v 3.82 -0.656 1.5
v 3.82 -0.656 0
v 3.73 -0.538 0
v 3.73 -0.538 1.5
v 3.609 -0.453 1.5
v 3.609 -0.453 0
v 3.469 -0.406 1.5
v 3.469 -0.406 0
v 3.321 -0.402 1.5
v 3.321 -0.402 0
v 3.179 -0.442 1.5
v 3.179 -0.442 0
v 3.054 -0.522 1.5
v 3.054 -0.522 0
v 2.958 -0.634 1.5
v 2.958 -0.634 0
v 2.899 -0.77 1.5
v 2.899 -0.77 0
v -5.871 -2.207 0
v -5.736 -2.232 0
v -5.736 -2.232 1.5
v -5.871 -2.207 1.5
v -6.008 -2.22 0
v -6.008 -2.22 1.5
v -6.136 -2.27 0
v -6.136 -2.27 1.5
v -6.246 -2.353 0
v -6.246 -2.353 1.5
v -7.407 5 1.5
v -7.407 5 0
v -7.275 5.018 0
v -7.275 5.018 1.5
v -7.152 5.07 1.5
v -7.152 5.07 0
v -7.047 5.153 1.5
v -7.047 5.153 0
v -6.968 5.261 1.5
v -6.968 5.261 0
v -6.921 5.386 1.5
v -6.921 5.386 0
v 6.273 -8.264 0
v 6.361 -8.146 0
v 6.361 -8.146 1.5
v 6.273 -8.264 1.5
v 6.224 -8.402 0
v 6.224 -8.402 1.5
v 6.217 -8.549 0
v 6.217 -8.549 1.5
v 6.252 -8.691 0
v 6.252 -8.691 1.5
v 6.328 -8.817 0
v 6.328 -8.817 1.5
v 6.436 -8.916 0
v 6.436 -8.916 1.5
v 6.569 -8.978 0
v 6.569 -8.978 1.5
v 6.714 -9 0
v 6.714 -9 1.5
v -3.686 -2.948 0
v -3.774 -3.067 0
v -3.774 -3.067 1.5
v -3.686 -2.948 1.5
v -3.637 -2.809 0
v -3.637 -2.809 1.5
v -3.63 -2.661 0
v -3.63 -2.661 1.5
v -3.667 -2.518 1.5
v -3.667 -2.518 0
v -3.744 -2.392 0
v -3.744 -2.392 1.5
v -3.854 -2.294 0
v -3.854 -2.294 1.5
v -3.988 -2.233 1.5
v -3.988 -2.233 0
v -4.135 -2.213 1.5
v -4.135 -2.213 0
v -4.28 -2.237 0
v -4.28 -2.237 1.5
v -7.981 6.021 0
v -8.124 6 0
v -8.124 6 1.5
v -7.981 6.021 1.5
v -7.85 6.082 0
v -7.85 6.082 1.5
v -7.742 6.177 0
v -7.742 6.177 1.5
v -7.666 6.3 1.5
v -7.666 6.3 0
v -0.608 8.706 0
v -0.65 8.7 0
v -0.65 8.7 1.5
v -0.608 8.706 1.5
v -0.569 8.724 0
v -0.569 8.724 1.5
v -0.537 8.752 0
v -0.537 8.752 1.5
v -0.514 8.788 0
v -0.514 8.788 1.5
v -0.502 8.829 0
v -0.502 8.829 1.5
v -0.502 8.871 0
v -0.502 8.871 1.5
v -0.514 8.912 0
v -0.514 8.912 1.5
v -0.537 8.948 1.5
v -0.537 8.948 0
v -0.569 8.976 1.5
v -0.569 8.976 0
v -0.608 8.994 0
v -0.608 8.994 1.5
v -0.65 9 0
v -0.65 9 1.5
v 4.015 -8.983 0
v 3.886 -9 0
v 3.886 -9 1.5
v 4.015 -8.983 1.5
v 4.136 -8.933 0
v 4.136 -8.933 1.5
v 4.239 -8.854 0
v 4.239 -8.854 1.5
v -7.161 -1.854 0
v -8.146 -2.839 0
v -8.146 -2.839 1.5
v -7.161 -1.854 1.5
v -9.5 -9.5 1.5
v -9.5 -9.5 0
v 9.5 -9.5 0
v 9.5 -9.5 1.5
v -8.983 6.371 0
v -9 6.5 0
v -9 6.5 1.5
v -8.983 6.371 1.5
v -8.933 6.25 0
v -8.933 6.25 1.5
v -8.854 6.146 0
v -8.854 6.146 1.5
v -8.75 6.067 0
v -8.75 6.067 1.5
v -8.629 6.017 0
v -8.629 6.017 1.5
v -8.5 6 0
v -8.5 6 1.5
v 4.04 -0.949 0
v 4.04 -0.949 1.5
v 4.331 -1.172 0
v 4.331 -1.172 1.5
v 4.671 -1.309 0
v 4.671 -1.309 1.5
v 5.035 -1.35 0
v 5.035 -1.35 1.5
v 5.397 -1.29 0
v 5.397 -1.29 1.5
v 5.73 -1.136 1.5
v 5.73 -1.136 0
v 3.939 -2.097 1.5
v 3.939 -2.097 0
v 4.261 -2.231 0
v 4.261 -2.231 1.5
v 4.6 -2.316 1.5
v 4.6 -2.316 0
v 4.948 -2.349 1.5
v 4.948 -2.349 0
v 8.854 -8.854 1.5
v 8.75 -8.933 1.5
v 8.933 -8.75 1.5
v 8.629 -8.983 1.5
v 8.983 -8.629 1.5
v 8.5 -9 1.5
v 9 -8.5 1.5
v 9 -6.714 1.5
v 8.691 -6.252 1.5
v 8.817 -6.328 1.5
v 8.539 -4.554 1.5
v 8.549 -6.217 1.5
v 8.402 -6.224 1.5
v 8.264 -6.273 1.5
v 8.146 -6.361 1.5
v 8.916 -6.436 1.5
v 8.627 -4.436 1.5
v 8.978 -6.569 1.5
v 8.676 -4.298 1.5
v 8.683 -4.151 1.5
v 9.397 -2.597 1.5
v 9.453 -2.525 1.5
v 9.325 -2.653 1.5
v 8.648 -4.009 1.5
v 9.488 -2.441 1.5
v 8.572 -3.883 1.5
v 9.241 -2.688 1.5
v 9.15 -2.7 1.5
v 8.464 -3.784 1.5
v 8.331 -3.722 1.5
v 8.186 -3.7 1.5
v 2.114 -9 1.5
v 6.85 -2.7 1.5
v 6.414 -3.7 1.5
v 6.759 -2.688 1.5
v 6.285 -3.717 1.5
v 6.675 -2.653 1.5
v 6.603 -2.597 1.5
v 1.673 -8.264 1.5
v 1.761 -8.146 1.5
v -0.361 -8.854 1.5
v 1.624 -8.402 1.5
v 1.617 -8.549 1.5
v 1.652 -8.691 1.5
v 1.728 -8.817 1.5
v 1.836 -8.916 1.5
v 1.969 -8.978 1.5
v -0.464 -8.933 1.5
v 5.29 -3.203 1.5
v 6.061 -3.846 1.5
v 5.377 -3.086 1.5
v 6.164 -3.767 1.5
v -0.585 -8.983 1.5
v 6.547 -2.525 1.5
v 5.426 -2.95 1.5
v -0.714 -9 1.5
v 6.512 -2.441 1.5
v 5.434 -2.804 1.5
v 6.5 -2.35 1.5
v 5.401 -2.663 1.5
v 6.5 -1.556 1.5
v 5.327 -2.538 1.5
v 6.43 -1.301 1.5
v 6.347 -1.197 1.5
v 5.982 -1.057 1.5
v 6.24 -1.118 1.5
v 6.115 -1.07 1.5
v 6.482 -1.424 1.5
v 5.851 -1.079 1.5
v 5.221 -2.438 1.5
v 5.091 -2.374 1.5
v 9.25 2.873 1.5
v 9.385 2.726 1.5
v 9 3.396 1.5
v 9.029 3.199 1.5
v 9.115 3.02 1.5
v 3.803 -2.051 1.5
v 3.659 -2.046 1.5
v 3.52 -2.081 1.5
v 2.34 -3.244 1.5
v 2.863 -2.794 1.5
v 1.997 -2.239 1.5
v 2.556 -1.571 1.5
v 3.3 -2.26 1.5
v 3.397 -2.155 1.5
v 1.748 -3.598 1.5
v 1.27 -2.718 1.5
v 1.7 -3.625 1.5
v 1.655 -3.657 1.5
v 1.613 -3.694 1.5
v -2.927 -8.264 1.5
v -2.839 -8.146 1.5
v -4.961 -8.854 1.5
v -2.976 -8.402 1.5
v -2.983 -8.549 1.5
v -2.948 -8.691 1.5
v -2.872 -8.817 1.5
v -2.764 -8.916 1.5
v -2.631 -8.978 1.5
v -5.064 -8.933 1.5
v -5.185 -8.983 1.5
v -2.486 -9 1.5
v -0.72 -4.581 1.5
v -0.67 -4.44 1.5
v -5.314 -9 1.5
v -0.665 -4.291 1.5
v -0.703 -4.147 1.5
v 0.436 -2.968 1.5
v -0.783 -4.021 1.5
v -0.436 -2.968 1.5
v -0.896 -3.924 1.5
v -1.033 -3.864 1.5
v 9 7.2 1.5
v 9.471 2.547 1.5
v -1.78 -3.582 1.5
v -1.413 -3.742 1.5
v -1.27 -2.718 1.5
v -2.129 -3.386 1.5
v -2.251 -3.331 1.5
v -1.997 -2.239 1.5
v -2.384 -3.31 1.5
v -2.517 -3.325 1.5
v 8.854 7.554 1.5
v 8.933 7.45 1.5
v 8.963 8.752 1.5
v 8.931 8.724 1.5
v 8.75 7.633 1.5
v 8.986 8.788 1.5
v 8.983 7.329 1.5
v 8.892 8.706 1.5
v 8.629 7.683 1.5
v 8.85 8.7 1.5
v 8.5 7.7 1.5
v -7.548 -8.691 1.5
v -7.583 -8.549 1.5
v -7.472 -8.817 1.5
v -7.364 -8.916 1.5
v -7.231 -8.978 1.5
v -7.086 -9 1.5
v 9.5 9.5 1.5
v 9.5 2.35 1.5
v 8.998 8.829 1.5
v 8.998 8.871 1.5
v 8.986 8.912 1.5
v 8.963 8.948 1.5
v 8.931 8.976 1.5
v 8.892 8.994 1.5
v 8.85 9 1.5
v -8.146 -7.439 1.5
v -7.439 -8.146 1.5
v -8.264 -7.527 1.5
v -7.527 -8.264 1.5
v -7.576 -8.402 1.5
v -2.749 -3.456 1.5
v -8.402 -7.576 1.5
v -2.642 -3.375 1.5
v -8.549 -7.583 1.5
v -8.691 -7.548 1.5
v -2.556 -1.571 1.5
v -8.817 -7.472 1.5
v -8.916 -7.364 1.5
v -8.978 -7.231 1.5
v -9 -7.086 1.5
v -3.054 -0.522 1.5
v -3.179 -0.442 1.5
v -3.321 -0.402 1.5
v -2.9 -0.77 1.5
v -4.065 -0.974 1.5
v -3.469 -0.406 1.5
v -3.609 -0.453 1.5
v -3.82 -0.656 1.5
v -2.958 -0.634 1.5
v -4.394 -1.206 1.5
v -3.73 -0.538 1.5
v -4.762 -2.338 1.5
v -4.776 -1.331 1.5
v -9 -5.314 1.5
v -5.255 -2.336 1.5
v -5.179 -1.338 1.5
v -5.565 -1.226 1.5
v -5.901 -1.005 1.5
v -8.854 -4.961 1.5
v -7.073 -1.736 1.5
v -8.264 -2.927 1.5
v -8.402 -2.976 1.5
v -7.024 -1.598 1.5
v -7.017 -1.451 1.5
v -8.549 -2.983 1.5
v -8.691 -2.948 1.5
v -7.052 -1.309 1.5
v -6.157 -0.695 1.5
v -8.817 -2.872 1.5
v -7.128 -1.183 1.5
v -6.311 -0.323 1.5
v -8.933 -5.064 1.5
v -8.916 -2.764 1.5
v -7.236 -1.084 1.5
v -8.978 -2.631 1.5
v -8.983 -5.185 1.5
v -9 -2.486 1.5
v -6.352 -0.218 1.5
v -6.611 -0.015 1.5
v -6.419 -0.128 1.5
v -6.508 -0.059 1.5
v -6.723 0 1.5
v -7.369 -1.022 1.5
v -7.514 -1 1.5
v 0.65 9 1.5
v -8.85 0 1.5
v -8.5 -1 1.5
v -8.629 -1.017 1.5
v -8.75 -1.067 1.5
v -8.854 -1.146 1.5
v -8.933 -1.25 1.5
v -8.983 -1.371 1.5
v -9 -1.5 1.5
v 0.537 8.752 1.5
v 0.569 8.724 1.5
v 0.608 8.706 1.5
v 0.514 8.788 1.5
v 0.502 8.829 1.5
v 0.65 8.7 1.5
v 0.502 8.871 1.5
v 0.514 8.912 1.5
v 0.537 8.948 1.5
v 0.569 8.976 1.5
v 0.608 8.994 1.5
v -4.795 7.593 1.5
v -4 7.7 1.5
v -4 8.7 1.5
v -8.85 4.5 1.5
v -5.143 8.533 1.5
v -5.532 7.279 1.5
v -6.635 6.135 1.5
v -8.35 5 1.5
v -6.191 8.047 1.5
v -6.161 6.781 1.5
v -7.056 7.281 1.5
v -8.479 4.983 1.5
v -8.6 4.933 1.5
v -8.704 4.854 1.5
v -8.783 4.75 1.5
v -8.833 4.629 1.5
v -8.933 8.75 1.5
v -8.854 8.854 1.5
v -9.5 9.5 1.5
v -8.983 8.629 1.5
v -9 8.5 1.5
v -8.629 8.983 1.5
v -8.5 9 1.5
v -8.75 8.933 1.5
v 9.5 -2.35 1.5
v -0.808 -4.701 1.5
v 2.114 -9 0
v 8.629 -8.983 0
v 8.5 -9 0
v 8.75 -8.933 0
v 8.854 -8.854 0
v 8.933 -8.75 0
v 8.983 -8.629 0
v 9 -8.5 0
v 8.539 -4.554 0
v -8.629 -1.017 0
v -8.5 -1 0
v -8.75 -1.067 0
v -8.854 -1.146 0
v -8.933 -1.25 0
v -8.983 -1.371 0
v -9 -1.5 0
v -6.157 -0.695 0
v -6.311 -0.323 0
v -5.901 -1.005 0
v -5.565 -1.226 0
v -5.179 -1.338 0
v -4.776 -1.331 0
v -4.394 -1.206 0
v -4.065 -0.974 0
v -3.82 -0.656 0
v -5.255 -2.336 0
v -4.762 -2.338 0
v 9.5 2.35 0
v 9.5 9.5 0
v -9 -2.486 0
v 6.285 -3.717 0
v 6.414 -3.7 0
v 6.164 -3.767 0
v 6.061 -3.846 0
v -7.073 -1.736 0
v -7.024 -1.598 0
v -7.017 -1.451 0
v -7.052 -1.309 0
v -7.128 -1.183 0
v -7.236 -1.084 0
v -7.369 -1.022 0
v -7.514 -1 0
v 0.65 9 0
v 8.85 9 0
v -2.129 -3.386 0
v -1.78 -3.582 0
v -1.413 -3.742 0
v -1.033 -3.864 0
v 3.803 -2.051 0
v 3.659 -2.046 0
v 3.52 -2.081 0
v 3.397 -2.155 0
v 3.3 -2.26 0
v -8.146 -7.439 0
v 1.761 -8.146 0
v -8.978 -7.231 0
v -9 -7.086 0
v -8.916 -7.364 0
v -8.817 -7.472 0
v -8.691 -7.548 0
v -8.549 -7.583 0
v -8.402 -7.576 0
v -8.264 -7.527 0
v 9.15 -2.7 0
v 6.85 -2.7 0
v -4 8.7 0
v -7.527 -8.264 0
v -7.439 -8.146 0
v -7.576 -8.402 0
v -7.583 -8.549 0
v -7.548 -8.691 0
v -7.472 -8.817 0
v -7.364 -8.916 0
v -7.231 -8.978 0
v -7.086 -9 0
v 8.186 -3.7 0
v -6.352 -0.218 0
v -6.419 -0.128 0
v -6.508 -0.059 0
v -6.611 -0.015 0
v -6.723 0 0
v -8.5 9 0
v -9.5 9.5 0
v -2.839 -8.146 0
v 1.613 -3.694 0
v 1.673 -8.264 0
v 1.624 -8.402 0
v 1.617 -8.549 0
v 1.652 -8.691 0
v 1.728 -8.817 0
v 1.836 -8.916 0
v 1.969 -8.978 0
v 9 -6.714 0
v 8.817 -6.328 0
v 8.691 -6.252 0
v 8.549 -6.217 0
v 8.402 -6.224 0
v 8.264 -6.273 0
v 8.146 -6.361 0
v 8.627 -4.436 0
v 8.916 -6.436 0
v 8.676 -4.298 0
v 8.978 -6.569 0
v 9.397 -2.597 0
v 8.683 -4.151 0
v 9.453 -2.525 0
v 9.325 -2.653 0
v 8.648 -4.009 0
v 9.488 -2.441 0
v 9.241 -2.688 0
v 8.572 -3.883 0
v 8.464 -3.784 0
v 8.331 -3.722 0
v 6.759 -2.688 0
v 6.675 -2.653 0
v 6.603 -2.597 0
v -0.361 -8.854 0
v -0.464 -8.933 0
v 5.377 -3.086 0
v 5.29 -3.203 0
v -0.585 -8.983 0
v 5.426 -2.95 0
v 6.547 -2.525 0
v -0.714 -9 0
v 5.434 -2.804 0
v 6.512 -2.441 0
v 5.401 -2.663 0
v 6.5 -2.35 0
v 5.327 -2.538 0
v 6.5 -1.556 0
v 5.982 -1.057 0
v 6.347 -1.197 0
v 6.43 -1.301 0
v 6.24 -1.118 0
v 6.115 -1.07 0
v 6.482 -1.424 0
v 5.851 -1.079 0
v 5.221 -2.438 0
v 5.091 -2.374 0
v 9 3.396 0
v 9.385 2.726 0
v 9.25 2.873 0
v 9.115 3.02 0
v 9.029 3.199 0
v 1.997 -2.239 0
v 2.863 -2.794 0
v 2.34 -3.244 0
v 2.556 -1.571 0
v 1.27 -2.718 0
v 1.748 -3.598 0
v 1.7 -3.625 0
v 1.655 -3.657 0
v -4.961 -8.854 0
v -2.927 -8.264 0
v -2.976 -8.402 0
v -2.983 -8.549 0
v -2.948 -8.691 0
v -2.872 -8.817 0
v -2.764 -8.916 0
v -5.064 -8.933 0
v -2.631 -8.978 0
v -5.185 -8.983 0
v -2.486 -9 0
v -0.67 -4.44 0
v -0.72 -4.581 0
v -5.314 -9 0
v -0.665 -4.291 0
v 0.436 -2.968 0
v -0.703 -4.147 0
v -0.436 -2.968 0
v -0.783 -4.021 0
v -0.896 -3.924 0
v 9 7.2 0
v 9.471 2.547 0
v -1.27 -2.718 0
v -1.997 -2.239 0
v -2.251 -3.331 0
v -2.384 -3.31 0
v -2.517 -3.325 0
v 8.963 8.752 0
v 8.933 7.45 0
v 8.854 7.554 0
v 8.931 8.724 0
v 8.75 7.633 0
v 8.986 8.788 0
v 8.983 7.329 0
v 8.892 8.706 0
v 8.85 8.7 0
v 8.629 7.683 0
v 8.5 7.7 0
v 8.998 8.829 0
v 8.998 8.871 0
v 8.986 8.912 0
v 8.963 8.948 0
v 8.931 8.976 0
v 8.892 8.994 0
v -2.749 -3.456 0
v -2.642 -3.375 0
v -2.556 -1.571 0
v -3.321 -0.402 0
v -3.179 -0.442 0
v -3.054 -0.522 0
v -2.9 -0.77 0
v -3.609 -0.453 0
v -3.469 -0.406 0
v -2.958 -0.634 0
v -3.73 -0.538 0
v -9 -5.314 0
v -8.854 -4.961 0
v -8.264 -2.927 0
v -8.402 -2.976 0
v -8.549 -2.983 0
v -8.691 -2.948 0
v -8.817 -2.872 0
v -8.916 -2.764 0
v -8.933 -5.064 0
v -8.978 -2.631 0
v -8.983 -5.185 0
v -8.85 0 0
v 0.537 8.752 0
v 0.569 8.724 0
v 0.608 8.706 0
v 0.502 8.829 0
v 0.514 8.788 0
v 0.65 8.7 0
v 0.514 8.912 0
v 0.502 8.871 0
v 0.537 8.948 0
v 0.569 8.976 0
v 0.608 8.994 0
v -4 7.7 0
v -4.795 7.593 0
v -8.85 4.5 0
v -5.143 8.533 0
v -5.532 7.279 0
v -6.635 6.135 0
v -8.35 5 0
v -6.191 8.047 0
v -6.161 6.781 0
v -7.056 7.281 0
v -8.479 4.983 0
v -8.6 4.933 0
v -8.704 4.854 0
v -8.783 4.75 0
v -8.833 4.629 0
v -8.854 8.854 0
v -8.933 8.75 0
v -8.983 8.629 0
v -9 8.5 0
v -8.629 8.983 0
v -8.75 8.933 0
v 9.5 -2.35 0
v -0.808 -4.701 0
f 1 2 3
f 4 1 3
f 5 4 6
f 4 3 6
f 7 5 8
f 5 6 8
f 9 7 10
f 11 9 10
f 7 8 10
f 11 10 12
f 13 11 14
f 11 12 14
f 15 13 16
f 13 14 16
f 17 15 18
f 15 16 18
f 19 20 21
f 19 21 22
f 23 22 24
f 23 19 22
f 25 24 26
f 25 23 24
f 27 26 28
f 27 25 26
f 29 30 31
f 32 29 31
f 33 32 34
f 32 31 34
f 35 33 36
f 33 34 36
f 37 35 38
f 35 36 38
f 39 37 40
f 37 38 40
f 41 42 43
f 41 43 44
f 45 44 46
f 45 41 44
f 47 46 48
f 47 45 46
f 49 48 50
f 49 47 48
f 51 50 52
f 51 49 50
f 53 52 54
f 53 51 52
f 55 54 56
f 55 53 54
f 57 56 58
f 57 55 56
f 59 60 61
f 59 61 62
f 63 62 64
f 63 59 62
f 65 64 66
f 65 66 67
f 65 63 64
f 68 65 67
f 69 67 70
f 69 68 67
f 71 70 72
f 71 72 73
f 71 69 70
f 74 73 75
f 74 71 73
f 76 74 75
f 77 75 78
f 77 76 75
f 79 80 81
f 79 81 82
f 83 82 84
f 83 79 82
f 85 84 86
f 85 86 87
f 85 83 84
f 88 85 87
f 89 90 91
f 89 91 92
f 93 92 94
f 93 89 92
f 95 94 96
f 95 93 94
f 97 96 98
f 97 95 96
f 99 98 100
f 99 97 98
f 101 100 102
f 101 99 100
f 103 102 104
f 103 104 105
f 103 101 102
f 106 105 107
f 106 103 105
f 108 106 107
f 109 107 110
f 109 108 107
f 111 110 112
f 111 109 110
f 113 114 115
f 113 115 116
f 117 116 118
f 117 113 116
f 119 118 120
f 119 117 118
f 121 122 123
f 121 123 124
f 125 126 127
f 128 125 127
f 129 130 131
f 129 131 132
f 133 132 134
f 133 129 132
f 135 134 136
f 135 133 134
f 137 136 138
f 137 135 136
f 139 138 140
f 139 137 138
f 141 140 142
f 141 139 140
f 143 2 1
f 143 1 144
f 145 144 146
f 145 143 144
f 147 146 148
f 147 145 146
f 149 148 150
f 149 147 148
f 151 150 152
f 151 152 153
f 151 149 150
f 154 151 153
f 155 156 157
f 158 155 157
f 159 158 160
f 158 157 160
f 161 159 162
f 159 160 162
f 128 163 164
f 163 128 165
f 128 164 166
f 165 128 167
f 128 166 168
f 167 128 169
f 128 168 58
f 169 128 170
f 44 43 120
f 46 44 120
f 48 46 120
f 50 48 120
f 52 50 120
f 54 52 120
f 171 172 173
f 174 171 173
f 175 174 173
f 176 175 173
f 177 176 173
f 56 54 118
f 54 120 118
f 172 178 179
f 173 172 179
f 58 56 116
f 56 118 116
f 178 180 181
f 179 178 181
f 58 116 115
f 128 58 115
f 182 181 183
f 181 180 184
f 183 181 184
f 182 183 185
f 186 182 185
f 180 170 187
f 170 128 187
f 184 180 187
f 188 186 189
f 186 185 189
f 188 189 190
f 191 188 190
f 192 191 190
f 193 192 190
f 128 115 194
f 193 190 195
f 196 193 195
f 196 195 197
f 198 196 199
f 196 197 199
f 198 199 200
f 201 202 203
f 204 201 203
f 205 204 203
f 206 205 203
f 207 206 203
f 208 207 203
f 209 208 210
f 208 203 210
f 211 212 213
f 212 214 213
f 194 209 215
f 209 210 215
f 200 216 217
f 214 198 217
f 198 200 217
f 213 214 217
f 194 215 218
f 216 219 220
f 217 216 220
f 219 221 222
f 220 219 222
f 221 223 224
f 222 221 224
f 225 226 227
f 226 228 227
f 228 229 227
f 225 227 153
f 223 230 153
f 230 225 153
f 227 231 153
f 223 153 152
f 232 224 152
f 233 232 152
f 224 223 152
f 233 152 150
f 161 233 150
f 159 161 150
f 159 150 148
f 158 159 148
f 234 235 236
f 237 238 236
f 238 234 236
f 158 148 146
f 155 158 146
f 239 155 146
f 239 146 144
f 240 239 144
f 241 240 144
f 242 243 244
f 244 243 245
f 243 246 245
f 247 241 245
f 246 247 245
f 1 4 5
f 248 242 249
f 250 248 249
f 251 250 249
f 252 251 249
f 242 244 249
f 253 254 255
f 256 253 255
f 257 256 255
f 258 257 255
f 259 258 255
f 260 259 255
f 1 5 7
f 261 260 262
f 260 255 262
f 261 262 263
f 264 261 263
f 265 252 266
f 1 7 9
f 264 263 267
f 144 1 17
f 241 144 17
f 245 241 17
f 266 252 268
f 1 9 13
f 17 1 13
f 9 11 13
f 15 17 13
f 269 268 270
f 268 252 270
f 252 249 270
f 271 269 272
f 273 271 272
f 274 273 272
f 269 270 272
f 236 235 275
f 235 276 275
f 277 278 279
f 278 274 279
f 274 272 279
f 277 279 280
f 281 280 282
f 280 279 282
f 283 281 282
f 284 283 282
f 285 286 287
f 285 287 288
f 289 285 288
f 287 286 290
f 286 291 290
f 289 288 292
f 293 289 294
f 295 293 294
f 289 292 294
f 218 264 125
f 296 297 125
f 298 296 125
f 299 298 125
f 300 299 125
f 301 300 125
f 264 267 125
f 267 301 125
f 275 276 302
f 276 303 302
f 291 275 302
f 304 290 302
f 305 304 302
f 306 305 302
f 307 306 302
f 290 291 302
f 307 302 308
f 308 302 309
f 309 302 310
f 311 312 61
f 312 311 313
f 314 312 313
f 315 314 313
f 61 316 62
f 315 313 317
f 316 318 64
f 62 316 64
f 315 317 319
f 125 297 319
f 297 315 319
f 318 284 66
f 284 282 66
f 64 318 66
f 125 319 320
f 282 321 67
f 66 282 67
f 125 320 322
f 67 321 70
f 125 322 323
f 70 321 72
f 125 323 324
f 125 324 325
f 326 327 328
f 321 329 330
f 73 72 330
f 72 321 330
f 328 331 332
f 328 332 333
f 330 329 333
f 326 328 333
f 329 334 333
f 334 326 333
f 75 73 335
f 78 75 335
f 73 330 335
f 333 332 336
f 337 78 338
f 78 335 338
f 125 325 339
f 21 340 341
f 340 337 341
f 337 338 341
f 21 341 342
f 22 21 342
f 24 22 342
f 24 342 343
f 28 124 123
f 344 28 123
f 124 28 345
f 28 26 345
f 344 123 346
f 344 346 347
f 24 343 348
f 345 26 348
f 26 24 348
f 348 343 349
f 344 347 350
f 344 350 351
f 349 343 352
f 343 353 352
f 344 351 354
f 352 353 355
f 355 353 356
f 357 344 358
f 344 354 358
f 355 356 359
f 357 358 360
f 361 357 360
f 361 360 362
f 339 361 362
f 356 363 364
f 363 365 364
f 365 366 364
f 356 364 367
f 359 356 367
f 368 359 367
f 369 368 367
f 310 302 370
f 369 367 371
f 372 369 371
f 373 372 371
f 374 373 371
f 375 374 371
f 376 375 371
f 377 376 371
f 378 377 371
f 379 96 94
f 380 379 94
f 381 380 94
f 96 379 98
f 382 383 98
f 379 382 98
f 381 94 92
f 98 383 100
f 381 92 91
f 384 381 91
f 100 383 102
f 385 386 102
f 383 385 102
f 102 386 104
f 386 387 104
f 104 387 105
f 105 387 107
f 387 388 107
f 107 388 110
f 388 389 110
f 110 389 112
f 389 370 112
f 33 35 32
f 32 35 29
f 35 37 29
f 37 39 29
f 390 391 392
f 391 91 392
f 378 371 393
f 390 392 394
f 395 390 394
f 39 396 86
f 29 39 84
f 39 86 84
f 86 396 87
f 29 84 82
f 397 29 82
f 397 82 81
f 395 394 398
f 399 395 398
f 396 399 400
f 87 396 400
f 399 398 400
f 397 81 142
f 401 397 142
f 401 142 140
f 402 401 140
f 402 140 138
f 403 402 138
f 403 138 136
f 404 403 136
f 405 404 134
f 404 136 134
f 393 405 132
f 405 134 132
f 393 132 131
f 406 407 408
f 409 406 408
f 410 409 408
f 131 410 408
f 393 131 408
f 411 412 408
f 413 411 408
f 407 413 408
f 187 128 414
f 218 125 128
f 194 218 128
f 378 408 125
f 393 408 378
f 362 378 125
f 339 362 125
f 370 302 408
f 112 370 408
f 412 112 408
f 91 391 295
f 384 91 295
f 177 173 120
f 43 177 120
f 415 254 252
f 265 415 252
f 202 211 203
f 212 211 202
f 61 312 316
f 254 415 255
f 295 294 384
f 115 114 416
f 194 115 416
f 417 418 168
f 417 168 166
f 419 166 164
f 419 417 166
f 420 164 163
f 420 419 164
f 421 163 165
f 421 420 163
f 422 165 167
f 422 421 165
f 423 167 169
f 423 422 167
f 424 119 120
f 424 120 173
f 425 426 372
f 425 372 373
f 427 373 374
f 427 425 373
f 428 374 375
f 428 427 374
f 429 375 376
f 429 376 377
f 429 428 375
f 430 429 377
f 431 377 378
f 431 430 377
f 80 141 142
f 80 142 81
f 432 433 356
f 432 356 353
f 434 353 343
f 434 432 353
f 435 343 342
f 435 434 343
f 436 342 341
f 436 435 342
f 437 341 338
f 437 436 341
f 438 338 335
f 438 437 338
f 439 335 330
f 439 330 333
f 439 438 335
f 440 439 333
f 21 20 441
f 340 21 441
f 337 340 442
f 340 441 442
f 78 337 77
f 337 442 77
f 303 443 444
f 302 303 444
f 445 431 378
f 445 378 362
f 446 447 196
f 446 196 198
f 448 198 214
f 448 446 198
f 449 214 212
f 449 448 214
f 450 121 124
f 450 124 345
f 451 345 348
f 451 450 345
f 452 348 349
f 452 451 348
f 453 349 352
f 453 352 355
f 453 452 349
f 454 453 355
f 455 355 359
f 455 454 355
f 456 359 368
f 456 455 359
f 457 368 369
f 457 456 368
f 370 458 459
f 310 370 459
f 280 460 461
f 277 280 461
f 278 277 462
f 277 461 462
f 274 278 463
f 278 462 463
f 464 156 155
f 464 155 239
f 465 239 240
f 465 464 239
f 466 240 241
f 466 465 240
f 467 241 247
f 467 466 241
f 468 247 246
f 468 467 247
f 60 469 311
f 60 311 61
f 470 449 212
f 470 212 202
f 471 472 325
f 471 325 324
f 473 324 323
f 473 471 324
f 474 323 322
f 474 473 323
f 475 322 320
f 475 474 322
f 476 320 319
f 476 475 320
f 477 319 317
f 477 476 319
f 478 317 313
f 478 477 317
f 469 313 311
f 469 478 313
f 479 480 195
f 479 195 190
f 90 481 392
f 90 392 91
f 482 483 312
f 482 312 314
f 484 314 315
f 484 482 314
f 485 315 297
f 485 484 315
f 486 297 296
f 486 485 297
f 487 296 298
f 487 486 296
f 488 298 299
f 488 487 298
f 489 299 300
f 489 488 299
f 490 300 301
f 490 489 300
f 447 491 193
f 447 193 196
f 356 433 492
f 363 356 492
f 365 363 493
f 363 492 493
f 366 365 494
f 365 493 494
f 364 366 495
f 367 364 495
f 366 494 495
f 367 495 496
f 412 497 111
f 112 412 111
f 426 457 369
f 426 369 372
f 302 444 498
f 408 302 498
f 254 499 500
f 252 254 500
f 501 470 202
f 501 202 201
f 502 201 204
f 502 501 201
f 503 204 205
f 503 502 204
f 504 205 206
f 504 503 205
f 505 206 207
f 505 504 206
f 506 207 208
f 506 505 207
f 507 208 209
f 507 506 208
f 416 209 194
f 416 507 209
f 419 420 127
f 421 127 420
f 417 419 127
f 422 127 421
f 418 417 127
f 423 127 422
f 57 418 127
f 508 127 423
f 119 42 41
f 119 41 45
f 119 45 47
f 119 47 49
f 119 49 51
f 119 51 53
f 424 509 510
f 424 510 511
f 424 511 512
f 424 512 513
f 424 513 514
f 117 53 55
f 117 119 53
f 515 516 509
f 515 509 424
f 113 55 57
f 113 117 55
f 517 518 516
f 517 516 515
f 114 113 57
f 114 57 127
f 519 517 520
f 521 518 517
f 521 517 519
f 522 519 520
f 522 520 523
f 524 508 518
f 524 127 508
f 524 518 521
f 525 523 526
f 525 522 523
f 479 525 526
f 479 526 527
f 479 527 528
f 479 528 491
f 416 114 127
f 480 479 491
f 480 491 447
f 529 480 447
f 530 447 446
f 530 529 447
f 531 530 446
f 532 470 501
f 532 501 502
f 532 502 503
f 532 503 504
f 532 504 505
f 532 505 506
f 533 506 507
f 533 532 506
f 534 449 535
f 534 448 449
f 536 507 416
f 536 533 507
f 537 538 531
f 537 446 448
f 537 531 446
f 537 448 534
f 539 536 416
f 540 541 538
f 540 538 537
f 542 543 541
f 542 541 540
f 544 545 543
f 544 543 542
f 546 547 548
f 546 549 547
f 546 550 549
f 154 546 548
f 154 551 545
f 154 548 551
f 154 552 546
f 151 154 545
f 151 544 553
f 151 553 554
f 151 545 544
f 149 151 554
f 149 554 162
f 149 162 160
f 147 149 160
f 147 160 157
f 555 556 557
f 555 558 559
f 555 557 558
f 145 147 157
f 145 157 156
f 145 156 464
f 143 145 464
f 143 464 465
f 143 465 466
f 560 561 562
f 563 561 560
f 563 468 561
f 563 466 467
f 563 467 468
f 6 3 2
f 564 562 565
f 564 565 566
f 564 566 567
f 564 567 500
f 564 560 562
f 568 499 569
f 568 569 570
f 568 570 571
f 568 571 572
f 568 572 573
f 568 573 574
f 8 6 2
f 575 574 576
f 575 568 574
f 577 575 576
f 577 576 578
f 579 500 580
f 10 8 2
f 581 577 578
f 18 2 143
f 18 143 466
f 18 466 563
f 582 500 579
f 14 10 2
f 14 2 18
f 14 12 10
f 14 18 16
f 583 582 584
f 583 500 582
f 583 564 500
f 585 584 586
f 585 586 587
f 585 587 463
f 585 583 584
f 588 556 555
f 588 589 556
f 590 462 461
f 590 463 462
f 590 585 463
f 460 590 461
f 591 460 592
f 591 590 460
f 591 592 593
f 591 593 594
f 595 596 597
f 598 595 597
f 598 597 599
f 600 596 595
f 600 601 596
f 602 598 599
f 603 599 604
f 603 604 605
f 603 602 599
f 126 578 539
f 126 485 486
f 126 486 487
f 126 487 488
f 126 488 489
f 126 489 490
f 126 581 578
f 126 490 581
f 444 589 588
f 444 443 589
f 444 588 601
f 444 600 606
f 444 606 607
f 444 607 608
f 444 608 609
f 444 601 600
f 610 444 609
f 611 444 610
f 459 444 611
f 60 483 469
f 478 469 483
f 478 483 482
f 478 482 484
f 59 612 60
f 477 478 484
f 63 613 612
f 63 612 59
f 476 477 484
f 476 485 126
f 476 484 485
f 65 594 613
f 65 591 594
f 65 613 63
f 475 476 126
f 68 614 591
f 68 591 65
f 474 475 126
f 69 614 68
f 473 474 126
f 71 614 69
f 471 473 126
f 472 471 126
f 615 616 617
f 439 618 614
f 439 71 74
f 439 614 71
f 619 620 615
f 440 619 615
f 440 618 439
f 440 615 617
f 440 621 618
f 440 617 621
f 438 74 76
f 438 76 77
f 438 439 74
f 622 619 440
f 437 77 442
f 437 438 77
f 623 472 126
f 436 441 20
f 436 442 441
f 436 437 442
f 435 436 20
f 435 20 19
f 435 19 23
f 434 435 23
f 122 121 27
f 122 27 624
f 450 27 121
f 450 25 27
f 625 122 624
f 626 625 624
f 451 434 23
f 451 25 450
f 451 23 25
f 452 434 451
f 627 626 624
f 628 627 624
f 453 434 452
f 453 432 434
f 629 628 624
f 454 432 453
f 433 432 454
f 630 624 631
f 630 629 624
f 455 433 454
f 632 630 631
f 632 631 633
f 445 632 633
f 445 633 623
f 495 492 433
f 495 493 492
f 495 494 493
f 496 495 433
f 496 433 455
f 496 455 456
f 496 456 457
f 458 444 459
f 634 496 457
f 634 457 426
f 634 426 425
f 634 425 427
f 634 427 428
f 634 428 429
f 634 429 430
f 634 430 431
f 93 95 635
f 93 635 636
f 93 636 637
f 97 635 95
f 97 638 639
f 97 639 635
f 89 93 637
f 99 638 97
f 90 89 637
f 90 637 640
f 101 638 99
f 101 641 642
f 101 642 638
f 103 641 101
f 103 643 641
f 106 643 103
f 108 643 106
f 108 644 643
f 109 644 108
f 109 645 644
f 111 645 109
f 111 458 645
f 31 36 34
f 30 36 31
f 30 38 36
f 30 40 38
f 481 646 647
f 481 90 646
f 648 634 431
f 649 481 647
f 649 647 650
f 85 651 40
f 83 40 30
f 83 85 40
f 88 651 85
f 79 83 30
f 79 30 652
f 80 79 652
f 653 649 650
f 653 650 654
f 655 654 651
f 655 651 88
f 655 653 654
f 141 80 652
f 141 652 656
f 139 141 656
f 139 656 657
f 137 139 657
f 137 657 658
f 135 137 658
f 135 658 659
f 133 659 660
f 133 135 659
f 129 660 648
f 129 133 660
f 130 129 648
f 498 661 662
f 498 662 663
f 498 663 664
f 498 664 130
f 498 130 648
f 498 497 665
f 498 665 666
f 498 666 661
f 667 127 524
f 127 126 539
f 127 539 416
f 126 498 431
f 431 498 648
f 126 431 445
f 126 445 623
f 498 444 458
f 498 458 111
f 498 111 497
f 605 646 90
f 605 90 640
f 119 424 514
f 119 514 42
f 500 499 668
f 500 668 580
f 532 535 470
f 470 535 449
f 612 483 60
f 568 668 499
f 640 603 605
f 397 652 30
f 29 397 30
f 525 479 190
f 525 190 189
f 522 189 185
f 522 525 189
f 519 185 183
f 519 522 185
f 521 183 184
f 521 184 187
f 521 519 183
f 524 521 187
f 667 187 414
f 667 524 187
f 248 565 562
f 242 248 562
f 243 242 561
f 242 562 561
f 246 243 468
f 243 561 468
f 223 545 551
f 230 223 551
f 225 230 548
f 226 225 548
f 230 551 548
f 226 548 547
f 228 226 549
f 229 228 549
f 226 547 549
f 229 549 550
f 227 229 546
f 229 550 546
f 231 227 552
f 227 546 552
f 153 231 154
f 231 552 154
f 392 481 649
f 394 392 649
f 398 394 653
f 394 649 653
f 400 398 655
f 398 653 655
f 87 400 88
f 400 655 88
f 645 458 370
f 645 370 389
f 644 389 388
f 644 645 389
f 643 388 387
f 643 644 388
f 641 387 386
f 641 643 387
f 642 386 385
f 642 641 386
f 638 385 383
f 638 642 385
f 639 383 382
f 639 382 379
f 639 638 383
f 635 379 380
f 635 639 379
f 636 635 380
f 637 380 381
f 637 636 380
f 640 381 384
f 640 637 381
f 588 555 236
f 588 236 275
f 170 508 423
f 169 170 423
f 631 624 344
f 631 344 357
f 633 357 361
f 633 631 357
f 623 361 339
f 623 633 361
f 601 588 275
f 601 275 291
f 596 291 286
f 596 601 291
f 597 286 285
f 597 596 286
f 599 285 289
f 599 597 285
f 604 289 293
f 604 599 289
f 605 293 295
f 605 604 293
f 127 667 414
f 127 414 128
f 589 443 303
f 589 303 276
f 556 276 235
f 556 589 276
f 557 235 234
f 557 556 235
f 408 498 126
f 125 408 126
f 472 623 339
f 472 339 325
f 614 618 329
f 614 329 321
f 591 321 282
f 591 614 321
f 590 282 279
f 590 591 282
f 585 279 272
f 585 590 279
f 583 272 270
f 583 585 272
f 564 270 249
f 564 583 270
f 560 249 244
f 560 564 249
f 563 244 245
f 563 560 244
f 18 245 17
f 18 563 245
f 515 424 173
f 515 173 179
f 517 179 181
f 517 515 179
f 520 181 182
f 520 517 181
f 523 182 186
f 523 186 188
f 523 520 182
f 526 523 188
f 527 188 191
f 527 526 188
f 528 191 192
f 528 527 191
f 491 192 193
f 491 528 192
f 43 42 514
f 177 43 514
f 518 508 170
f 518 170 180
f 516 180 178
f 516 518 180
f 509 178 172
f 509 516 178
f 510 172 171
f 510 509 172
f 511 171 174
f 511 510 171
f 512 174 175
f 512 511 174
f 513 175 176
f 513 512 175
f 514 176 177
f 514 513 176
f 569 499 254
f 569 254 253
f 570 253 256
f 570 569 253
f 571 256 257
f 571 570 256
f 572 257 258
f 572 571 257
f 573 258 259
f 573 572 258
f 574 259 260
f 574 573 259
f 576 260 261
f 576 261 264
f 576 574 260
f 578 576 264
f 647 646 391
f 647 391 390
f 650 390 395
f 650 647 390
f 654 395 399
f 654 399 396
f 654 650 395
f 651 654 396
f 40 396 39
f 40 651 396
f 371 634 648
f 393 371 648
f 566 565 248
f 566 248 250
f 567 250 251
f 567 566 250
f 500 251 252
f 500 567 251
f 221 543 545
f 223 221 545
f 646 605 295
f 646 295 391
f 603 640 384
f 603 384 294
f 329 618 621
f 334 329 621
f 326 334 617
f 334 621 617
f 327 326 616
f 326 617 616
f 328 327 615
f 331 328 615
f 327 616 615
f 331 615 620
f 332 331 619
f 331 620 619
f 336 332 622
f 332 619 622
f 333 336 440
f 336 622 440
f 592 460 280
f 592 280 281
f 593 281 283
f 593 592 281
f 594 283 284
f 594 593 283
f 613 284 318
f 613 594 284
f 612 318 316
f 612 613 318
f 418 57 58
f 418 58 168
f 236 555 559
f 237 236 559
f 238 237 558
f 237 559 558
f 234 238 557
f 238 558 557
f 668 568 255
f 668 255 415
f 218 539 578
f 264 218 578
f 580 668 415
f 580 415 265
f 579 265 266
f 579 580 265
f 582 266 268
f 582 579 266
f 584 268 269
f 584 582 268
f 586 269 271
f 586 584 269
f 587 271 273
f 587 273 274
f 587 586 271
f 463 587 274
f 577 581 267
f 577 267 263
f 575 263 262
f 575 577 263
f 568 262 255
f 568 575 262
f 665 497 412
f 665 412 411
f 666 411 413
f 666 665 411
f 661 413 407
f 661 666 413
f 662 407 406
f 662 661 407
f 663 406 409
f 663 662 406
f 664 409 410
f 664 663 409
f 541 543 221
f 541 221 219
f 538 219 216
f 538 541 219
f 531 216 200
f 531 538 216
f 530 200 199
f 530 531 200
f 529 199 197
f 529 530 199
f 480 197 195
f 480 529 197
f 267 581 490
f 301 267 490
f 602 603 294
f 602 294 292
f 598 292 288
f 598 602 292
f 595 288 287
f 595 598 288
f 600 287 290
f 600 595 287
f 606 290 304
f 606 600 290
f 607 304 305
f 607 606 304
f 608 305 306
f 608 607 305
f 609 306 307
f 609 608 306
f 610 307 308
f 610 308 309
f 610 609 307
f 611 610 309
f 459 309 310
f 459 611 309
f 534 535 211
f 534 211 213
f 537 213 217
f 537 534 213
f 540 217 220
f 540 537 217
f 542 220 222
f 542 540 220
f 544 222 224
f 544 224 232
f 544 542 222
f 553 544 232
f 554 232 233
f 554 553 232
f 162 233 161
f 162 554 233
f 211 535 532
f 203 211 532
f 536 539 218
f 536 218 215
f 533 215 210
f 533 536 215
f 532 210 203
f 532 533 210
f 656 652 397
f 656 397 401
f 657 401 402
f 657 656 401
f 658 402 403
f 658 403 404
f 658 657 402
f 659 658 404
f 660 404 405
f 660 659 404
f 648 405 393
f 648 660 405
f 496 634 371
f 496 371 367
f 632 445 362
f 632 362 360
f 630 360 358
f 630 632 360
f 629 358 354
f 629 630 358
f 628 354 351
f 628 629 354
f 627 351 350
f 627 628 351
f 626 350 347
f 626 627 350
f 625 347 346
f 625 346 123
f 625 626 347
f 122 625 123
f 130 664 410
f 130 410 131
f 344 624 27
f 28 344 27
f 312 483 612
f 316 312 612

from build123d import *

# Parameters (mm, degrees)
PAD_DEPTH = 1.5


with BuildPart() as part:
    # Sketch → Pad (new body)
    with BuildSketch(Plane.XY):
        with BuildLine():
            ThreePointArc((-2.8995, -0.77), (0, -3), (2.8995, -0.77))
            ThreePointArc((3.819845, -0.65554), (3.321042, -0.402156), (2.8995, -0.77))
            ThreePointArc((3.819845, -0.65554), (4.670792, -1.309245), (5.72973, -1.135779))
            ThreePointArc((6.5, -1.556438), (6.239651, -1.117613), (5.72973, -1.135779))
            Line((6.5, -2.35), (6.5, -1.556438))
            ThreePointArc((6.5, -2.35), (6.602513, -2.597487), (6.85, -2.7))
            Line((6.85, -2.7), (9.15, -2.7))
            ThreePointArc((9.15, -2.7), (9.397487, -2.597487), (9.5, -2.35))
            Line((9.5, -2.35), (9.5, -9.5))
            Line((-9.5, -9.5), (9.5, -9.5))
            Line((-9.5, 9.5), (-9.5, -9.5))
            Line((9.5, 9.5), (-9.5, 9.5))
            Line((9.5, 2.35), (9.5, 9.5))
            ThreePointArc((9.5, 2.35), (9.434288, 2.639872), (9.25, 2.873071))
            ThreePointArc((9, 3.396143), (9.065712, 3.106271), (9.25, 2.873071))
            Line((9, 3.396143), (9, 7.2))
            ThreePointArc((9, 7.2), (8.853553, 7.553553), (8.5, 7.7))
            Line((8.5, 7.7), (-4, 7.7))
            ThreePointArc((-4, 7.7), (-5.863177, 7.051291), (-6.920581, 5.385714))
            ThreePointArc((-7.407345, 5), (-7.096816, 5.108118), (-6.920581, 5.385714))
            Line((-8.35, 5), (-7.407345, 5))
            ThreePointArc((-8.35, 5), (-8.703553, 4.853553), (-8.85, 4.5))
            Line((-8.85, 0), (-8.85, 4.5))
            Line((-8.85, 0), (-6.722884, 0))
            ThreePointArc((-6.310819, -0.322882), (-6.461135, -0.090335), (-6.722884, 0))
            ThreePointArc((-6.310819, -0.322882), (-5.1787, -1.33812), (-3.819845, -0.65554))
            ThreePointArc((-2.8995, -0.77), (-3.321042, -0.402156), (-3.819845, -0.65554))
        make_face()
        with BuildLine():
            Line((-8.146447, -7.43934), (-3.773762, -3.066655))
            ThreePointArc((-3.773762, -3.066655), (-3.70061, -2.452483), (-4.280418, -2.237119))
            ThreePointArc((-5.735884, -2.23181), (-5.008573, -2.349984), (-4.280418, -2.237119))
            ThreePointArc((-5.735884, -2.23181), (-6.008123, -2.220226), (-6.246009, -2.353109))
            Line((-8.853553, -4.960654), (-6.246009, -2.353109))
            ThreePointArc((-8.853553, -4.960654), (-8.96194, -5.122866), (-9, -5.314207))
            Line((-9, -5.314207), (-9, -7.085786))
            ThreePointArc((-9, -7.085786), (-8.691342, -7.547726), (-8.146447, -7.43934))
        make_face(mode=Mode.SUBTRACT)
        with BuildLine():
            Line((-7.43934, -8.146447), (-2.748865, -3.455972))
            ThreePointArc((-2.129166, -3.386245), (-2.451218, -3.312661), (-2.748865, -3.455972))
            ThreePointArc((-2.129166, -3.386245), (-1.598864, -3.666556), (-1.032607, -3.864417))
            ThreePointArc((-0.80813, -4.701023), (-0.678765, -4.217893), (-1.032607, -3.864417))
            Line((-4.96066, -8.853553), (-0.80813, -4.701023))
            ThreePointArc((-5.314214, -9), (-5.122872, -8.96194), (-4.96066, -8.853553))
            Line((-5.314214, -9), (-7.085786, -9))
            ThreePointArc((-7.43934, -8.146447), (-7.547726, -8.691342), (-7.085786, -9))
        make_face(mode=Mode.SUBTRACT)
        with BuildLine():
            Line((-7.51422, -1), (-8.5, -1))
            ThreePointArc((-8.5, -1), (-8.853553, -1.146447), (-9, -1.5))
            Line((-9, -1.5), (-9, -2.48578))
            ThreePointArc((-9, -2.48578), (-8.691342, -2.94772), (-8.146447, -2.839334))
            Line((-8.146447, -2.839334), (-7.160666, -1.853553))
            ThreePointArc((-7.160666, -1.853553), (-7.05228, -1.308658), (-7.51422, -1))
        make_face(mode=Mode.SUBTRACT)
        with BuildLine():
            ThreePointArc((1.748237, -3.597731), (2.611317, -3.03002), (3.300222, -2.260206))
            ThreePointArc((3.938583, -2.096639), (3.588644, -2.058379), (3.300222, -2.260206))
            ThreePointArc((3.938583, -2.096639), (4.428947, -2.279561), (4.947635, -2.349417))
            ThreePointArc((5.290047, -3.202846), (5.400537, -2.66311), (4.947635, -2.349417))
            Line((5.290047, -3.202846), (-0.36066, -8.853553))
            ThreePointArc((-0.714214, -9), (-0.522872, -8.96194), (-0.36066, -8.853553))
            Line((-0.714214, -9), (-2.485786, -9))
            ThreePointArc((-2.83934, -8.146447), (-2.947726, -8.691342), (-2.485786, -9))
            Line((-2.83934, -8.146447), (1.613213, -3.693894))
            ThreePointArc((1.748237, -3.597731), (1.676712, -3.640178), (1.613213, -3.693894))
        make_face(mode=Mode.SUBTRACT)
        with BuildLine():
            ThreePointArc((8.5, -9), (8.853553, -8.853553), (9, -8.5))
            Line((9, -6.714214), (9, -8.5))
            ThreePointArc((9, -6.714214), (8.691342, -6.252274), (8.146447, -6.36066))
            Line((6.36066, -8.146447), (8.146447, -6.36066))
            ThreePointArc((6.36066, -8.146447), (6.252274, -8.691342), (6.714214, -9))
            Line((6.714214, -9), (8.5, -9))
        make_face(mode=Mode.SUBTRACT)
        with BuildLine():
            Line((8.185786, -3.7), (6.414214, -3.7))
            ThreePointArc((6.414214, -3.7), (6.222872, -3.73806), (6.06066, -3.846447))
            Line((6.06066, -3.846447), (1.76066, -8.146447))
            ThreePointArc((1.76066, -8.146447), (1.652274, -8.691342), (2.114214, -9))
            Line((3.885786, -9), (2.114214, -9))
            ThreePointArc((3.885786, -9), (4.077128, -8.96194), (4.23934, -8.853553))
            Line((4.23934, -8.853553), (8.53934, -4.553553))
            ThreePointArc((8.53934, -4.553553), (8.647726, -4.008658), (8.185786, -3.7))
        make_face(mode=Mode.SUBTRACT)
        with BuildLine():
            Line((-9, 8.5), (-9, 6.5))
            ThreePointArc((-9, 6.5), (-8.853553, 6.146447), (-8.5, 6))
            Line((-8.5, 6), (-8.124318, 6))
            ThreePointArc((-8.124318, 6), (-7.850457, 6.08167), (-7.666061, 6.3))
            ThreePointArc((-4, 8.7), (-6.19089, 8.04664), (-7.666061, 6.3))
            Line((-4, 8.7), (-0.65, 8.7))
            ThreePointArc((-0.65, 8.7), (-0.5, 8.85), (-0.65, 9))
            Line((-8.5, 9), (-0.65, 9))
            ThreePointArc((-8.5, 9), (-8.853553, 8.853553), (-9, 8.5))
        make_face(mode=Mode.SUBTRACT)
        with BuildLine():
            ThreePointArc((8.85, 8.7), (9, 8.85), (8.85, 9))
            Line((0.65, 9), (8.85, 9))
            ThreePointArc((0.65, 9), (0.5, 8.85), (0.65, 8.7))
            Line((0.65, 8.7), (8.85, 8.7))
        make_face(mode=Mode.SUBTRACT)
    extrude(amount=PAD_DEPTH)


solid = part.part
